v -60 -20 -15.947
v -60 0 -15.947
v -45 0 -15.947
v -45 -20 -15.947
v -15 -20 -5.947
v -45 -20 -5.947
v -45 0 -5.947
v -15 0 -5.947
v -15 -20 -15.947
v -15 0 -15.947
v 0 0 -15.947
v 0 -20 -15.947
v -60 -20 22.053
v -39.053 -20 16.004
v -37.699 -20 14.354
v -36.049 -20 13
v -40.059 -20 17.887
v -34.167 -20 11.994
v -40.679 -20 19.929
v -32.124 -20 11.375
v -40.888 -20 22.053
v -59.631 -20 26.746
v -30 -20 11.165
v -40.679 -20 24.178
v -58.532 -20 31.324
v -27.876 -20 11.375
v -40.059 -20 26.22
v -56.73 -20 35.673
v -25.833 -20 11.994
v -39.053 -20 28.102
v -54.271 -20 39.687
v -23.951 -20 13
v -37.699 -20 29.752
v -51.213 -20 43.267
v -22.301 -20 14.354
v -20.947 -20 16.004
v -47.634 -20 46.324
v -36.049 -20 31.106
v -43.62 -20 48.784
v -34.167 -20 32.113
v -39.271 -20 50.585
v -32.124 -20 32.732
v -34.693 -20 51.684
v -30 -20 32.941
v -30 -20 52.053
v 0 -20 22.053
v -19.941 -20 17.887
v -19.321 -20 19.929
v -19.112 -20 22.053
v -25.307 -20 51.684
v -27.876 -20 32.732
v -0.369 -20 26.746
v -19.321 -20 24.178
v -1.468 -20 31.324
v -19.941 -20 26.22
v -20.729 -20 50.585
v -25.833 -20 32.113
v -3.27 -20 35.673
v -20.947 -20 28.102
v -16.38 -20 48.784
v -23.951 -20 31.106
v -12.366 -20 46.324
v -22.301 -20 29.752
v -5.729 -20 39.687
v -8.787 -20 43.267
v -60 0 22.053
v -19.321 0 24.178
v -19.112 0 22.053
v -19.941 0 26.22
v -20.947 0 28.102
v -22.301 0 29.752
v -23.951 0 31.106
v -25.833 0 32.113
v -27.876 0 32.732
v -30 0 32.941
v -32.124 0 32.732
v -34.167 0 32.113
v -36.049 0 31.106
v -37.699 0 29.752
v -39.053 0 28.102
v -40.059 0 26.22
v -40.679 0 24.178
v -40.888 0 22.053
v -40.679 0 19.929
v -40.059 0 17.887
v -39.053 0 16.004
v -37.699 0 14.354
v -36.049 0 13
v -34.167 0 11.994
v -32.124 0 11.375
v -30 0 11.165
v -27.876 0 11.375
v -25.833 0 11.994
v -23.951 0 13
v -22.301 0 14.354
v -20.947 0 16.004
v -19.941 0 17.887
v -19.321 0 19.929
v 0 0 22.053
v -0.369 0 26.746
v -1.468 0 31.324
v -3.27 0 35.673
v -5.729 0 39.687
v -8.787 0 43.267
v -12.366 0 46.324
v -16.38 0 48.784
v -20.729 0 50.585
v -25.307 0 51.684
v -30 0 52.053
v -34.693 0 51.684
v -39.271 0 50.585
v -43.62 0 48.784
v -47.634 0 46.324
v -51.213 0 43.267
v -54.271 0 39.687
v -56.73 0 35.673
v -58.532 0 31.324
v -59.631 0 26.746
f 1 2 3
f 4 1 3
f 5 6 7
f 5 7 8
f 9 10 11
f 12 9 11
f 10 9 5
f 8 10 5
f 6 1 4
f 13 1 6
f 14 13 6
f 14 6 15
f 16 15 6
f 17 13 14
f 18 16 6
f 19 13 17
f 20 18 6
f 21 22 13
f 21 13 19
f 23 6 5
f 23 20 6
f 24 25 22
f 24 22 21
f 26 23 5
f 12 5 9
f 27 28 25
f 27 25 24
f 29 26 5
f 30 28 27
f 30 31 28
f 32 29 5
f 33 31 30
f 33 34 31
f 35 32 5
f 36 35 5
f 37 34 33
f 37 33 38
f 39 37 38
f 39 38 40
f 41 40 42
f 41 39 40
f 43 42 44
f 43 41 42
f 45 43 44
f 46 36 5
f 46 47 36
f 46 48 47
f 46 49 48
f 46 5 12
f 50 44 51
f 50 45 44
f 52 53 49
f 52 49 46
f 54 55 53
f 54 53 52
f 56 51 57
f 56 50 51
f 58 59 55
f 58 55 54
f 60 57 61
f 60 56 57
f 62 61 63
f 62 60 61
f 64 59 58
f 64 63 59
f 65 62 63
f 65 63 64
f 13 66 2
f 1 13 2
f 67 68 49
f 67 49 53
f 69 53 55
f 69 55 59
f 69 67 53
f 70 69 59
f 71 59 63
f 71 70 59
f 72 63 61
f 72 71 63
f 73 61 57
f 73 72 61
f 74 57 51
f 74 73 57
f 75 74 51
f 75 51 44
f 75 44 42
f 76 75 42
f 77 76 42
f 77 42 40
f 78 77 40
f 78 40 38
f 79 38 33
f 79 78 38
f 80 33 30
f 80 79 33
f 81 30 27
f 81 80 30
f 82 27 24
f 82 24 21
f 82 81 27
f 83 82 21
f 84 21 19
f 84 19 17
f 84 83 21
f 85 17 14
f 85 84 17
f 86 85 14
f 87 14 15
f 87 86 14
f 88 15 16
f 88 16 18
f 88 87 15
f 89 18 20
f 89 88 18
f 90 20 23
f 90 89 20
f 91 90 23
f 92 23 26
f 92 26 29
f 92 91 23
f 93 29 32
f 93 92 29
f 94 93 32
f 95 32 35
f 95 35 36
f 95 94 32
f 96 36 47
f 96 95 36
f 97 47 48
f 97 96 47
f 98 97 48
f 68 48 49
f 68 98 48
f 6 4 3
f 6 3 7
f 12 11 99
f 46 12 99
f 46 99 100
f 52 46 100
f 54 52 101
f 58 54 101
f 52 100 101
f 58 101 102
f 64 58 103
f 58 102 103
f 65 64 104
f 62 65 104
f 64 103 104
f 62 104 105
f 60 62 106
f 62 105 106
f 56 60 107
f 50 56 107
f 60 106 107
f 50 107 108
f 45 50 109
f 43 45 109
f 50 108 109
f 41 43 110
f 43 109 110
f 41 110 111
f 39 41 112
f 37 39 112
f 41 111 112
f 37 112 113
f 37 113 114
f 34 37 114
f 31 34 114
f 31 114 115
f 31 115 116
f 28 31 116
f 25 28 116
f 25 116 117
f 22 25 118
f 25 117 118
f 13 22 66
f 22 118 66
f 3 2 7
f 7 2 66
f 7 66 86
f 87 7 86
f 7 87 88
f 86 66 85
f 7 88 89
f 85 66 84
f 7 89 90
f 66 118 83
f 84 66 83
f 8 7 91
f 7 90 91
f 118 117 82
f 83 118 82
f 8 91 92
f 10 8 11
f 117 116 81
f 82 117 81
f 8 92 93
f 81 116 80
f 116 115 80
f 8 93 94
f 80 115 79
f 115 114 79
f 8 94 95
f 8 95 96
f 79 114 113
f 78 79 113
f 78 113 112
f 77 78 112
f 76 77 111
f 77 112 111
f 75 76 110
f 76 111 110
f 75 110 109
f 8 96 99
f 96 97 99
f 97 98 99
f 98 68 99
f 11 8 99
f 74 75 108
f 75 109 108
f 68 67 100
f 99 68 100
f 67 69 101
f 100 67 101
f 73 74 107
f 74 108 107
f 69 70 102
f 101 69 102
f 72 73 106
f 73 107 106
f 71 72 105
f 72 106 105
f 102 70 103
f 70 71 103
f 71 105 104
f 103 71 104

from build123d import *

# Parameters (mm, degrees)
F0_R     = 10.887967
F1_DEPTH = 20
F2_W     = 30
F2_H     = 10
F3_DEPTH = 20.001


with BuildPart() as f1:
    # F0 (on Front) → F1 (new body)
    with BuildSketch(Plane.XZ):
        with BuildLine():
            ThreePointArc((0, 22.053424), (-30, 52.053424), (-60, 22.053424))
            Line((-60, 22.053424), (-60, -15.946576))
            Line((-60, -15.946576), (0, -15.946576))
            Line((0, -15.946576), (0, 22.053424))
        make_face()
        with Locations((-30, 22.053424)):
            Circle(F0_R, mode=Mode.SUBTRACT)
    extrude(amount=F1_DEPTH)

    # F2 (on face) → F3 (cut, through all)
    with BuildSketch(Plane.XZ.offset(20)):
        with Locations((-30, -10.946576)):
            Rectangle(F2_W, F2_H)
    extrude(amount=-F3_DEPTH, mode=Mode.SUBTRACT)


solid = f1.part
